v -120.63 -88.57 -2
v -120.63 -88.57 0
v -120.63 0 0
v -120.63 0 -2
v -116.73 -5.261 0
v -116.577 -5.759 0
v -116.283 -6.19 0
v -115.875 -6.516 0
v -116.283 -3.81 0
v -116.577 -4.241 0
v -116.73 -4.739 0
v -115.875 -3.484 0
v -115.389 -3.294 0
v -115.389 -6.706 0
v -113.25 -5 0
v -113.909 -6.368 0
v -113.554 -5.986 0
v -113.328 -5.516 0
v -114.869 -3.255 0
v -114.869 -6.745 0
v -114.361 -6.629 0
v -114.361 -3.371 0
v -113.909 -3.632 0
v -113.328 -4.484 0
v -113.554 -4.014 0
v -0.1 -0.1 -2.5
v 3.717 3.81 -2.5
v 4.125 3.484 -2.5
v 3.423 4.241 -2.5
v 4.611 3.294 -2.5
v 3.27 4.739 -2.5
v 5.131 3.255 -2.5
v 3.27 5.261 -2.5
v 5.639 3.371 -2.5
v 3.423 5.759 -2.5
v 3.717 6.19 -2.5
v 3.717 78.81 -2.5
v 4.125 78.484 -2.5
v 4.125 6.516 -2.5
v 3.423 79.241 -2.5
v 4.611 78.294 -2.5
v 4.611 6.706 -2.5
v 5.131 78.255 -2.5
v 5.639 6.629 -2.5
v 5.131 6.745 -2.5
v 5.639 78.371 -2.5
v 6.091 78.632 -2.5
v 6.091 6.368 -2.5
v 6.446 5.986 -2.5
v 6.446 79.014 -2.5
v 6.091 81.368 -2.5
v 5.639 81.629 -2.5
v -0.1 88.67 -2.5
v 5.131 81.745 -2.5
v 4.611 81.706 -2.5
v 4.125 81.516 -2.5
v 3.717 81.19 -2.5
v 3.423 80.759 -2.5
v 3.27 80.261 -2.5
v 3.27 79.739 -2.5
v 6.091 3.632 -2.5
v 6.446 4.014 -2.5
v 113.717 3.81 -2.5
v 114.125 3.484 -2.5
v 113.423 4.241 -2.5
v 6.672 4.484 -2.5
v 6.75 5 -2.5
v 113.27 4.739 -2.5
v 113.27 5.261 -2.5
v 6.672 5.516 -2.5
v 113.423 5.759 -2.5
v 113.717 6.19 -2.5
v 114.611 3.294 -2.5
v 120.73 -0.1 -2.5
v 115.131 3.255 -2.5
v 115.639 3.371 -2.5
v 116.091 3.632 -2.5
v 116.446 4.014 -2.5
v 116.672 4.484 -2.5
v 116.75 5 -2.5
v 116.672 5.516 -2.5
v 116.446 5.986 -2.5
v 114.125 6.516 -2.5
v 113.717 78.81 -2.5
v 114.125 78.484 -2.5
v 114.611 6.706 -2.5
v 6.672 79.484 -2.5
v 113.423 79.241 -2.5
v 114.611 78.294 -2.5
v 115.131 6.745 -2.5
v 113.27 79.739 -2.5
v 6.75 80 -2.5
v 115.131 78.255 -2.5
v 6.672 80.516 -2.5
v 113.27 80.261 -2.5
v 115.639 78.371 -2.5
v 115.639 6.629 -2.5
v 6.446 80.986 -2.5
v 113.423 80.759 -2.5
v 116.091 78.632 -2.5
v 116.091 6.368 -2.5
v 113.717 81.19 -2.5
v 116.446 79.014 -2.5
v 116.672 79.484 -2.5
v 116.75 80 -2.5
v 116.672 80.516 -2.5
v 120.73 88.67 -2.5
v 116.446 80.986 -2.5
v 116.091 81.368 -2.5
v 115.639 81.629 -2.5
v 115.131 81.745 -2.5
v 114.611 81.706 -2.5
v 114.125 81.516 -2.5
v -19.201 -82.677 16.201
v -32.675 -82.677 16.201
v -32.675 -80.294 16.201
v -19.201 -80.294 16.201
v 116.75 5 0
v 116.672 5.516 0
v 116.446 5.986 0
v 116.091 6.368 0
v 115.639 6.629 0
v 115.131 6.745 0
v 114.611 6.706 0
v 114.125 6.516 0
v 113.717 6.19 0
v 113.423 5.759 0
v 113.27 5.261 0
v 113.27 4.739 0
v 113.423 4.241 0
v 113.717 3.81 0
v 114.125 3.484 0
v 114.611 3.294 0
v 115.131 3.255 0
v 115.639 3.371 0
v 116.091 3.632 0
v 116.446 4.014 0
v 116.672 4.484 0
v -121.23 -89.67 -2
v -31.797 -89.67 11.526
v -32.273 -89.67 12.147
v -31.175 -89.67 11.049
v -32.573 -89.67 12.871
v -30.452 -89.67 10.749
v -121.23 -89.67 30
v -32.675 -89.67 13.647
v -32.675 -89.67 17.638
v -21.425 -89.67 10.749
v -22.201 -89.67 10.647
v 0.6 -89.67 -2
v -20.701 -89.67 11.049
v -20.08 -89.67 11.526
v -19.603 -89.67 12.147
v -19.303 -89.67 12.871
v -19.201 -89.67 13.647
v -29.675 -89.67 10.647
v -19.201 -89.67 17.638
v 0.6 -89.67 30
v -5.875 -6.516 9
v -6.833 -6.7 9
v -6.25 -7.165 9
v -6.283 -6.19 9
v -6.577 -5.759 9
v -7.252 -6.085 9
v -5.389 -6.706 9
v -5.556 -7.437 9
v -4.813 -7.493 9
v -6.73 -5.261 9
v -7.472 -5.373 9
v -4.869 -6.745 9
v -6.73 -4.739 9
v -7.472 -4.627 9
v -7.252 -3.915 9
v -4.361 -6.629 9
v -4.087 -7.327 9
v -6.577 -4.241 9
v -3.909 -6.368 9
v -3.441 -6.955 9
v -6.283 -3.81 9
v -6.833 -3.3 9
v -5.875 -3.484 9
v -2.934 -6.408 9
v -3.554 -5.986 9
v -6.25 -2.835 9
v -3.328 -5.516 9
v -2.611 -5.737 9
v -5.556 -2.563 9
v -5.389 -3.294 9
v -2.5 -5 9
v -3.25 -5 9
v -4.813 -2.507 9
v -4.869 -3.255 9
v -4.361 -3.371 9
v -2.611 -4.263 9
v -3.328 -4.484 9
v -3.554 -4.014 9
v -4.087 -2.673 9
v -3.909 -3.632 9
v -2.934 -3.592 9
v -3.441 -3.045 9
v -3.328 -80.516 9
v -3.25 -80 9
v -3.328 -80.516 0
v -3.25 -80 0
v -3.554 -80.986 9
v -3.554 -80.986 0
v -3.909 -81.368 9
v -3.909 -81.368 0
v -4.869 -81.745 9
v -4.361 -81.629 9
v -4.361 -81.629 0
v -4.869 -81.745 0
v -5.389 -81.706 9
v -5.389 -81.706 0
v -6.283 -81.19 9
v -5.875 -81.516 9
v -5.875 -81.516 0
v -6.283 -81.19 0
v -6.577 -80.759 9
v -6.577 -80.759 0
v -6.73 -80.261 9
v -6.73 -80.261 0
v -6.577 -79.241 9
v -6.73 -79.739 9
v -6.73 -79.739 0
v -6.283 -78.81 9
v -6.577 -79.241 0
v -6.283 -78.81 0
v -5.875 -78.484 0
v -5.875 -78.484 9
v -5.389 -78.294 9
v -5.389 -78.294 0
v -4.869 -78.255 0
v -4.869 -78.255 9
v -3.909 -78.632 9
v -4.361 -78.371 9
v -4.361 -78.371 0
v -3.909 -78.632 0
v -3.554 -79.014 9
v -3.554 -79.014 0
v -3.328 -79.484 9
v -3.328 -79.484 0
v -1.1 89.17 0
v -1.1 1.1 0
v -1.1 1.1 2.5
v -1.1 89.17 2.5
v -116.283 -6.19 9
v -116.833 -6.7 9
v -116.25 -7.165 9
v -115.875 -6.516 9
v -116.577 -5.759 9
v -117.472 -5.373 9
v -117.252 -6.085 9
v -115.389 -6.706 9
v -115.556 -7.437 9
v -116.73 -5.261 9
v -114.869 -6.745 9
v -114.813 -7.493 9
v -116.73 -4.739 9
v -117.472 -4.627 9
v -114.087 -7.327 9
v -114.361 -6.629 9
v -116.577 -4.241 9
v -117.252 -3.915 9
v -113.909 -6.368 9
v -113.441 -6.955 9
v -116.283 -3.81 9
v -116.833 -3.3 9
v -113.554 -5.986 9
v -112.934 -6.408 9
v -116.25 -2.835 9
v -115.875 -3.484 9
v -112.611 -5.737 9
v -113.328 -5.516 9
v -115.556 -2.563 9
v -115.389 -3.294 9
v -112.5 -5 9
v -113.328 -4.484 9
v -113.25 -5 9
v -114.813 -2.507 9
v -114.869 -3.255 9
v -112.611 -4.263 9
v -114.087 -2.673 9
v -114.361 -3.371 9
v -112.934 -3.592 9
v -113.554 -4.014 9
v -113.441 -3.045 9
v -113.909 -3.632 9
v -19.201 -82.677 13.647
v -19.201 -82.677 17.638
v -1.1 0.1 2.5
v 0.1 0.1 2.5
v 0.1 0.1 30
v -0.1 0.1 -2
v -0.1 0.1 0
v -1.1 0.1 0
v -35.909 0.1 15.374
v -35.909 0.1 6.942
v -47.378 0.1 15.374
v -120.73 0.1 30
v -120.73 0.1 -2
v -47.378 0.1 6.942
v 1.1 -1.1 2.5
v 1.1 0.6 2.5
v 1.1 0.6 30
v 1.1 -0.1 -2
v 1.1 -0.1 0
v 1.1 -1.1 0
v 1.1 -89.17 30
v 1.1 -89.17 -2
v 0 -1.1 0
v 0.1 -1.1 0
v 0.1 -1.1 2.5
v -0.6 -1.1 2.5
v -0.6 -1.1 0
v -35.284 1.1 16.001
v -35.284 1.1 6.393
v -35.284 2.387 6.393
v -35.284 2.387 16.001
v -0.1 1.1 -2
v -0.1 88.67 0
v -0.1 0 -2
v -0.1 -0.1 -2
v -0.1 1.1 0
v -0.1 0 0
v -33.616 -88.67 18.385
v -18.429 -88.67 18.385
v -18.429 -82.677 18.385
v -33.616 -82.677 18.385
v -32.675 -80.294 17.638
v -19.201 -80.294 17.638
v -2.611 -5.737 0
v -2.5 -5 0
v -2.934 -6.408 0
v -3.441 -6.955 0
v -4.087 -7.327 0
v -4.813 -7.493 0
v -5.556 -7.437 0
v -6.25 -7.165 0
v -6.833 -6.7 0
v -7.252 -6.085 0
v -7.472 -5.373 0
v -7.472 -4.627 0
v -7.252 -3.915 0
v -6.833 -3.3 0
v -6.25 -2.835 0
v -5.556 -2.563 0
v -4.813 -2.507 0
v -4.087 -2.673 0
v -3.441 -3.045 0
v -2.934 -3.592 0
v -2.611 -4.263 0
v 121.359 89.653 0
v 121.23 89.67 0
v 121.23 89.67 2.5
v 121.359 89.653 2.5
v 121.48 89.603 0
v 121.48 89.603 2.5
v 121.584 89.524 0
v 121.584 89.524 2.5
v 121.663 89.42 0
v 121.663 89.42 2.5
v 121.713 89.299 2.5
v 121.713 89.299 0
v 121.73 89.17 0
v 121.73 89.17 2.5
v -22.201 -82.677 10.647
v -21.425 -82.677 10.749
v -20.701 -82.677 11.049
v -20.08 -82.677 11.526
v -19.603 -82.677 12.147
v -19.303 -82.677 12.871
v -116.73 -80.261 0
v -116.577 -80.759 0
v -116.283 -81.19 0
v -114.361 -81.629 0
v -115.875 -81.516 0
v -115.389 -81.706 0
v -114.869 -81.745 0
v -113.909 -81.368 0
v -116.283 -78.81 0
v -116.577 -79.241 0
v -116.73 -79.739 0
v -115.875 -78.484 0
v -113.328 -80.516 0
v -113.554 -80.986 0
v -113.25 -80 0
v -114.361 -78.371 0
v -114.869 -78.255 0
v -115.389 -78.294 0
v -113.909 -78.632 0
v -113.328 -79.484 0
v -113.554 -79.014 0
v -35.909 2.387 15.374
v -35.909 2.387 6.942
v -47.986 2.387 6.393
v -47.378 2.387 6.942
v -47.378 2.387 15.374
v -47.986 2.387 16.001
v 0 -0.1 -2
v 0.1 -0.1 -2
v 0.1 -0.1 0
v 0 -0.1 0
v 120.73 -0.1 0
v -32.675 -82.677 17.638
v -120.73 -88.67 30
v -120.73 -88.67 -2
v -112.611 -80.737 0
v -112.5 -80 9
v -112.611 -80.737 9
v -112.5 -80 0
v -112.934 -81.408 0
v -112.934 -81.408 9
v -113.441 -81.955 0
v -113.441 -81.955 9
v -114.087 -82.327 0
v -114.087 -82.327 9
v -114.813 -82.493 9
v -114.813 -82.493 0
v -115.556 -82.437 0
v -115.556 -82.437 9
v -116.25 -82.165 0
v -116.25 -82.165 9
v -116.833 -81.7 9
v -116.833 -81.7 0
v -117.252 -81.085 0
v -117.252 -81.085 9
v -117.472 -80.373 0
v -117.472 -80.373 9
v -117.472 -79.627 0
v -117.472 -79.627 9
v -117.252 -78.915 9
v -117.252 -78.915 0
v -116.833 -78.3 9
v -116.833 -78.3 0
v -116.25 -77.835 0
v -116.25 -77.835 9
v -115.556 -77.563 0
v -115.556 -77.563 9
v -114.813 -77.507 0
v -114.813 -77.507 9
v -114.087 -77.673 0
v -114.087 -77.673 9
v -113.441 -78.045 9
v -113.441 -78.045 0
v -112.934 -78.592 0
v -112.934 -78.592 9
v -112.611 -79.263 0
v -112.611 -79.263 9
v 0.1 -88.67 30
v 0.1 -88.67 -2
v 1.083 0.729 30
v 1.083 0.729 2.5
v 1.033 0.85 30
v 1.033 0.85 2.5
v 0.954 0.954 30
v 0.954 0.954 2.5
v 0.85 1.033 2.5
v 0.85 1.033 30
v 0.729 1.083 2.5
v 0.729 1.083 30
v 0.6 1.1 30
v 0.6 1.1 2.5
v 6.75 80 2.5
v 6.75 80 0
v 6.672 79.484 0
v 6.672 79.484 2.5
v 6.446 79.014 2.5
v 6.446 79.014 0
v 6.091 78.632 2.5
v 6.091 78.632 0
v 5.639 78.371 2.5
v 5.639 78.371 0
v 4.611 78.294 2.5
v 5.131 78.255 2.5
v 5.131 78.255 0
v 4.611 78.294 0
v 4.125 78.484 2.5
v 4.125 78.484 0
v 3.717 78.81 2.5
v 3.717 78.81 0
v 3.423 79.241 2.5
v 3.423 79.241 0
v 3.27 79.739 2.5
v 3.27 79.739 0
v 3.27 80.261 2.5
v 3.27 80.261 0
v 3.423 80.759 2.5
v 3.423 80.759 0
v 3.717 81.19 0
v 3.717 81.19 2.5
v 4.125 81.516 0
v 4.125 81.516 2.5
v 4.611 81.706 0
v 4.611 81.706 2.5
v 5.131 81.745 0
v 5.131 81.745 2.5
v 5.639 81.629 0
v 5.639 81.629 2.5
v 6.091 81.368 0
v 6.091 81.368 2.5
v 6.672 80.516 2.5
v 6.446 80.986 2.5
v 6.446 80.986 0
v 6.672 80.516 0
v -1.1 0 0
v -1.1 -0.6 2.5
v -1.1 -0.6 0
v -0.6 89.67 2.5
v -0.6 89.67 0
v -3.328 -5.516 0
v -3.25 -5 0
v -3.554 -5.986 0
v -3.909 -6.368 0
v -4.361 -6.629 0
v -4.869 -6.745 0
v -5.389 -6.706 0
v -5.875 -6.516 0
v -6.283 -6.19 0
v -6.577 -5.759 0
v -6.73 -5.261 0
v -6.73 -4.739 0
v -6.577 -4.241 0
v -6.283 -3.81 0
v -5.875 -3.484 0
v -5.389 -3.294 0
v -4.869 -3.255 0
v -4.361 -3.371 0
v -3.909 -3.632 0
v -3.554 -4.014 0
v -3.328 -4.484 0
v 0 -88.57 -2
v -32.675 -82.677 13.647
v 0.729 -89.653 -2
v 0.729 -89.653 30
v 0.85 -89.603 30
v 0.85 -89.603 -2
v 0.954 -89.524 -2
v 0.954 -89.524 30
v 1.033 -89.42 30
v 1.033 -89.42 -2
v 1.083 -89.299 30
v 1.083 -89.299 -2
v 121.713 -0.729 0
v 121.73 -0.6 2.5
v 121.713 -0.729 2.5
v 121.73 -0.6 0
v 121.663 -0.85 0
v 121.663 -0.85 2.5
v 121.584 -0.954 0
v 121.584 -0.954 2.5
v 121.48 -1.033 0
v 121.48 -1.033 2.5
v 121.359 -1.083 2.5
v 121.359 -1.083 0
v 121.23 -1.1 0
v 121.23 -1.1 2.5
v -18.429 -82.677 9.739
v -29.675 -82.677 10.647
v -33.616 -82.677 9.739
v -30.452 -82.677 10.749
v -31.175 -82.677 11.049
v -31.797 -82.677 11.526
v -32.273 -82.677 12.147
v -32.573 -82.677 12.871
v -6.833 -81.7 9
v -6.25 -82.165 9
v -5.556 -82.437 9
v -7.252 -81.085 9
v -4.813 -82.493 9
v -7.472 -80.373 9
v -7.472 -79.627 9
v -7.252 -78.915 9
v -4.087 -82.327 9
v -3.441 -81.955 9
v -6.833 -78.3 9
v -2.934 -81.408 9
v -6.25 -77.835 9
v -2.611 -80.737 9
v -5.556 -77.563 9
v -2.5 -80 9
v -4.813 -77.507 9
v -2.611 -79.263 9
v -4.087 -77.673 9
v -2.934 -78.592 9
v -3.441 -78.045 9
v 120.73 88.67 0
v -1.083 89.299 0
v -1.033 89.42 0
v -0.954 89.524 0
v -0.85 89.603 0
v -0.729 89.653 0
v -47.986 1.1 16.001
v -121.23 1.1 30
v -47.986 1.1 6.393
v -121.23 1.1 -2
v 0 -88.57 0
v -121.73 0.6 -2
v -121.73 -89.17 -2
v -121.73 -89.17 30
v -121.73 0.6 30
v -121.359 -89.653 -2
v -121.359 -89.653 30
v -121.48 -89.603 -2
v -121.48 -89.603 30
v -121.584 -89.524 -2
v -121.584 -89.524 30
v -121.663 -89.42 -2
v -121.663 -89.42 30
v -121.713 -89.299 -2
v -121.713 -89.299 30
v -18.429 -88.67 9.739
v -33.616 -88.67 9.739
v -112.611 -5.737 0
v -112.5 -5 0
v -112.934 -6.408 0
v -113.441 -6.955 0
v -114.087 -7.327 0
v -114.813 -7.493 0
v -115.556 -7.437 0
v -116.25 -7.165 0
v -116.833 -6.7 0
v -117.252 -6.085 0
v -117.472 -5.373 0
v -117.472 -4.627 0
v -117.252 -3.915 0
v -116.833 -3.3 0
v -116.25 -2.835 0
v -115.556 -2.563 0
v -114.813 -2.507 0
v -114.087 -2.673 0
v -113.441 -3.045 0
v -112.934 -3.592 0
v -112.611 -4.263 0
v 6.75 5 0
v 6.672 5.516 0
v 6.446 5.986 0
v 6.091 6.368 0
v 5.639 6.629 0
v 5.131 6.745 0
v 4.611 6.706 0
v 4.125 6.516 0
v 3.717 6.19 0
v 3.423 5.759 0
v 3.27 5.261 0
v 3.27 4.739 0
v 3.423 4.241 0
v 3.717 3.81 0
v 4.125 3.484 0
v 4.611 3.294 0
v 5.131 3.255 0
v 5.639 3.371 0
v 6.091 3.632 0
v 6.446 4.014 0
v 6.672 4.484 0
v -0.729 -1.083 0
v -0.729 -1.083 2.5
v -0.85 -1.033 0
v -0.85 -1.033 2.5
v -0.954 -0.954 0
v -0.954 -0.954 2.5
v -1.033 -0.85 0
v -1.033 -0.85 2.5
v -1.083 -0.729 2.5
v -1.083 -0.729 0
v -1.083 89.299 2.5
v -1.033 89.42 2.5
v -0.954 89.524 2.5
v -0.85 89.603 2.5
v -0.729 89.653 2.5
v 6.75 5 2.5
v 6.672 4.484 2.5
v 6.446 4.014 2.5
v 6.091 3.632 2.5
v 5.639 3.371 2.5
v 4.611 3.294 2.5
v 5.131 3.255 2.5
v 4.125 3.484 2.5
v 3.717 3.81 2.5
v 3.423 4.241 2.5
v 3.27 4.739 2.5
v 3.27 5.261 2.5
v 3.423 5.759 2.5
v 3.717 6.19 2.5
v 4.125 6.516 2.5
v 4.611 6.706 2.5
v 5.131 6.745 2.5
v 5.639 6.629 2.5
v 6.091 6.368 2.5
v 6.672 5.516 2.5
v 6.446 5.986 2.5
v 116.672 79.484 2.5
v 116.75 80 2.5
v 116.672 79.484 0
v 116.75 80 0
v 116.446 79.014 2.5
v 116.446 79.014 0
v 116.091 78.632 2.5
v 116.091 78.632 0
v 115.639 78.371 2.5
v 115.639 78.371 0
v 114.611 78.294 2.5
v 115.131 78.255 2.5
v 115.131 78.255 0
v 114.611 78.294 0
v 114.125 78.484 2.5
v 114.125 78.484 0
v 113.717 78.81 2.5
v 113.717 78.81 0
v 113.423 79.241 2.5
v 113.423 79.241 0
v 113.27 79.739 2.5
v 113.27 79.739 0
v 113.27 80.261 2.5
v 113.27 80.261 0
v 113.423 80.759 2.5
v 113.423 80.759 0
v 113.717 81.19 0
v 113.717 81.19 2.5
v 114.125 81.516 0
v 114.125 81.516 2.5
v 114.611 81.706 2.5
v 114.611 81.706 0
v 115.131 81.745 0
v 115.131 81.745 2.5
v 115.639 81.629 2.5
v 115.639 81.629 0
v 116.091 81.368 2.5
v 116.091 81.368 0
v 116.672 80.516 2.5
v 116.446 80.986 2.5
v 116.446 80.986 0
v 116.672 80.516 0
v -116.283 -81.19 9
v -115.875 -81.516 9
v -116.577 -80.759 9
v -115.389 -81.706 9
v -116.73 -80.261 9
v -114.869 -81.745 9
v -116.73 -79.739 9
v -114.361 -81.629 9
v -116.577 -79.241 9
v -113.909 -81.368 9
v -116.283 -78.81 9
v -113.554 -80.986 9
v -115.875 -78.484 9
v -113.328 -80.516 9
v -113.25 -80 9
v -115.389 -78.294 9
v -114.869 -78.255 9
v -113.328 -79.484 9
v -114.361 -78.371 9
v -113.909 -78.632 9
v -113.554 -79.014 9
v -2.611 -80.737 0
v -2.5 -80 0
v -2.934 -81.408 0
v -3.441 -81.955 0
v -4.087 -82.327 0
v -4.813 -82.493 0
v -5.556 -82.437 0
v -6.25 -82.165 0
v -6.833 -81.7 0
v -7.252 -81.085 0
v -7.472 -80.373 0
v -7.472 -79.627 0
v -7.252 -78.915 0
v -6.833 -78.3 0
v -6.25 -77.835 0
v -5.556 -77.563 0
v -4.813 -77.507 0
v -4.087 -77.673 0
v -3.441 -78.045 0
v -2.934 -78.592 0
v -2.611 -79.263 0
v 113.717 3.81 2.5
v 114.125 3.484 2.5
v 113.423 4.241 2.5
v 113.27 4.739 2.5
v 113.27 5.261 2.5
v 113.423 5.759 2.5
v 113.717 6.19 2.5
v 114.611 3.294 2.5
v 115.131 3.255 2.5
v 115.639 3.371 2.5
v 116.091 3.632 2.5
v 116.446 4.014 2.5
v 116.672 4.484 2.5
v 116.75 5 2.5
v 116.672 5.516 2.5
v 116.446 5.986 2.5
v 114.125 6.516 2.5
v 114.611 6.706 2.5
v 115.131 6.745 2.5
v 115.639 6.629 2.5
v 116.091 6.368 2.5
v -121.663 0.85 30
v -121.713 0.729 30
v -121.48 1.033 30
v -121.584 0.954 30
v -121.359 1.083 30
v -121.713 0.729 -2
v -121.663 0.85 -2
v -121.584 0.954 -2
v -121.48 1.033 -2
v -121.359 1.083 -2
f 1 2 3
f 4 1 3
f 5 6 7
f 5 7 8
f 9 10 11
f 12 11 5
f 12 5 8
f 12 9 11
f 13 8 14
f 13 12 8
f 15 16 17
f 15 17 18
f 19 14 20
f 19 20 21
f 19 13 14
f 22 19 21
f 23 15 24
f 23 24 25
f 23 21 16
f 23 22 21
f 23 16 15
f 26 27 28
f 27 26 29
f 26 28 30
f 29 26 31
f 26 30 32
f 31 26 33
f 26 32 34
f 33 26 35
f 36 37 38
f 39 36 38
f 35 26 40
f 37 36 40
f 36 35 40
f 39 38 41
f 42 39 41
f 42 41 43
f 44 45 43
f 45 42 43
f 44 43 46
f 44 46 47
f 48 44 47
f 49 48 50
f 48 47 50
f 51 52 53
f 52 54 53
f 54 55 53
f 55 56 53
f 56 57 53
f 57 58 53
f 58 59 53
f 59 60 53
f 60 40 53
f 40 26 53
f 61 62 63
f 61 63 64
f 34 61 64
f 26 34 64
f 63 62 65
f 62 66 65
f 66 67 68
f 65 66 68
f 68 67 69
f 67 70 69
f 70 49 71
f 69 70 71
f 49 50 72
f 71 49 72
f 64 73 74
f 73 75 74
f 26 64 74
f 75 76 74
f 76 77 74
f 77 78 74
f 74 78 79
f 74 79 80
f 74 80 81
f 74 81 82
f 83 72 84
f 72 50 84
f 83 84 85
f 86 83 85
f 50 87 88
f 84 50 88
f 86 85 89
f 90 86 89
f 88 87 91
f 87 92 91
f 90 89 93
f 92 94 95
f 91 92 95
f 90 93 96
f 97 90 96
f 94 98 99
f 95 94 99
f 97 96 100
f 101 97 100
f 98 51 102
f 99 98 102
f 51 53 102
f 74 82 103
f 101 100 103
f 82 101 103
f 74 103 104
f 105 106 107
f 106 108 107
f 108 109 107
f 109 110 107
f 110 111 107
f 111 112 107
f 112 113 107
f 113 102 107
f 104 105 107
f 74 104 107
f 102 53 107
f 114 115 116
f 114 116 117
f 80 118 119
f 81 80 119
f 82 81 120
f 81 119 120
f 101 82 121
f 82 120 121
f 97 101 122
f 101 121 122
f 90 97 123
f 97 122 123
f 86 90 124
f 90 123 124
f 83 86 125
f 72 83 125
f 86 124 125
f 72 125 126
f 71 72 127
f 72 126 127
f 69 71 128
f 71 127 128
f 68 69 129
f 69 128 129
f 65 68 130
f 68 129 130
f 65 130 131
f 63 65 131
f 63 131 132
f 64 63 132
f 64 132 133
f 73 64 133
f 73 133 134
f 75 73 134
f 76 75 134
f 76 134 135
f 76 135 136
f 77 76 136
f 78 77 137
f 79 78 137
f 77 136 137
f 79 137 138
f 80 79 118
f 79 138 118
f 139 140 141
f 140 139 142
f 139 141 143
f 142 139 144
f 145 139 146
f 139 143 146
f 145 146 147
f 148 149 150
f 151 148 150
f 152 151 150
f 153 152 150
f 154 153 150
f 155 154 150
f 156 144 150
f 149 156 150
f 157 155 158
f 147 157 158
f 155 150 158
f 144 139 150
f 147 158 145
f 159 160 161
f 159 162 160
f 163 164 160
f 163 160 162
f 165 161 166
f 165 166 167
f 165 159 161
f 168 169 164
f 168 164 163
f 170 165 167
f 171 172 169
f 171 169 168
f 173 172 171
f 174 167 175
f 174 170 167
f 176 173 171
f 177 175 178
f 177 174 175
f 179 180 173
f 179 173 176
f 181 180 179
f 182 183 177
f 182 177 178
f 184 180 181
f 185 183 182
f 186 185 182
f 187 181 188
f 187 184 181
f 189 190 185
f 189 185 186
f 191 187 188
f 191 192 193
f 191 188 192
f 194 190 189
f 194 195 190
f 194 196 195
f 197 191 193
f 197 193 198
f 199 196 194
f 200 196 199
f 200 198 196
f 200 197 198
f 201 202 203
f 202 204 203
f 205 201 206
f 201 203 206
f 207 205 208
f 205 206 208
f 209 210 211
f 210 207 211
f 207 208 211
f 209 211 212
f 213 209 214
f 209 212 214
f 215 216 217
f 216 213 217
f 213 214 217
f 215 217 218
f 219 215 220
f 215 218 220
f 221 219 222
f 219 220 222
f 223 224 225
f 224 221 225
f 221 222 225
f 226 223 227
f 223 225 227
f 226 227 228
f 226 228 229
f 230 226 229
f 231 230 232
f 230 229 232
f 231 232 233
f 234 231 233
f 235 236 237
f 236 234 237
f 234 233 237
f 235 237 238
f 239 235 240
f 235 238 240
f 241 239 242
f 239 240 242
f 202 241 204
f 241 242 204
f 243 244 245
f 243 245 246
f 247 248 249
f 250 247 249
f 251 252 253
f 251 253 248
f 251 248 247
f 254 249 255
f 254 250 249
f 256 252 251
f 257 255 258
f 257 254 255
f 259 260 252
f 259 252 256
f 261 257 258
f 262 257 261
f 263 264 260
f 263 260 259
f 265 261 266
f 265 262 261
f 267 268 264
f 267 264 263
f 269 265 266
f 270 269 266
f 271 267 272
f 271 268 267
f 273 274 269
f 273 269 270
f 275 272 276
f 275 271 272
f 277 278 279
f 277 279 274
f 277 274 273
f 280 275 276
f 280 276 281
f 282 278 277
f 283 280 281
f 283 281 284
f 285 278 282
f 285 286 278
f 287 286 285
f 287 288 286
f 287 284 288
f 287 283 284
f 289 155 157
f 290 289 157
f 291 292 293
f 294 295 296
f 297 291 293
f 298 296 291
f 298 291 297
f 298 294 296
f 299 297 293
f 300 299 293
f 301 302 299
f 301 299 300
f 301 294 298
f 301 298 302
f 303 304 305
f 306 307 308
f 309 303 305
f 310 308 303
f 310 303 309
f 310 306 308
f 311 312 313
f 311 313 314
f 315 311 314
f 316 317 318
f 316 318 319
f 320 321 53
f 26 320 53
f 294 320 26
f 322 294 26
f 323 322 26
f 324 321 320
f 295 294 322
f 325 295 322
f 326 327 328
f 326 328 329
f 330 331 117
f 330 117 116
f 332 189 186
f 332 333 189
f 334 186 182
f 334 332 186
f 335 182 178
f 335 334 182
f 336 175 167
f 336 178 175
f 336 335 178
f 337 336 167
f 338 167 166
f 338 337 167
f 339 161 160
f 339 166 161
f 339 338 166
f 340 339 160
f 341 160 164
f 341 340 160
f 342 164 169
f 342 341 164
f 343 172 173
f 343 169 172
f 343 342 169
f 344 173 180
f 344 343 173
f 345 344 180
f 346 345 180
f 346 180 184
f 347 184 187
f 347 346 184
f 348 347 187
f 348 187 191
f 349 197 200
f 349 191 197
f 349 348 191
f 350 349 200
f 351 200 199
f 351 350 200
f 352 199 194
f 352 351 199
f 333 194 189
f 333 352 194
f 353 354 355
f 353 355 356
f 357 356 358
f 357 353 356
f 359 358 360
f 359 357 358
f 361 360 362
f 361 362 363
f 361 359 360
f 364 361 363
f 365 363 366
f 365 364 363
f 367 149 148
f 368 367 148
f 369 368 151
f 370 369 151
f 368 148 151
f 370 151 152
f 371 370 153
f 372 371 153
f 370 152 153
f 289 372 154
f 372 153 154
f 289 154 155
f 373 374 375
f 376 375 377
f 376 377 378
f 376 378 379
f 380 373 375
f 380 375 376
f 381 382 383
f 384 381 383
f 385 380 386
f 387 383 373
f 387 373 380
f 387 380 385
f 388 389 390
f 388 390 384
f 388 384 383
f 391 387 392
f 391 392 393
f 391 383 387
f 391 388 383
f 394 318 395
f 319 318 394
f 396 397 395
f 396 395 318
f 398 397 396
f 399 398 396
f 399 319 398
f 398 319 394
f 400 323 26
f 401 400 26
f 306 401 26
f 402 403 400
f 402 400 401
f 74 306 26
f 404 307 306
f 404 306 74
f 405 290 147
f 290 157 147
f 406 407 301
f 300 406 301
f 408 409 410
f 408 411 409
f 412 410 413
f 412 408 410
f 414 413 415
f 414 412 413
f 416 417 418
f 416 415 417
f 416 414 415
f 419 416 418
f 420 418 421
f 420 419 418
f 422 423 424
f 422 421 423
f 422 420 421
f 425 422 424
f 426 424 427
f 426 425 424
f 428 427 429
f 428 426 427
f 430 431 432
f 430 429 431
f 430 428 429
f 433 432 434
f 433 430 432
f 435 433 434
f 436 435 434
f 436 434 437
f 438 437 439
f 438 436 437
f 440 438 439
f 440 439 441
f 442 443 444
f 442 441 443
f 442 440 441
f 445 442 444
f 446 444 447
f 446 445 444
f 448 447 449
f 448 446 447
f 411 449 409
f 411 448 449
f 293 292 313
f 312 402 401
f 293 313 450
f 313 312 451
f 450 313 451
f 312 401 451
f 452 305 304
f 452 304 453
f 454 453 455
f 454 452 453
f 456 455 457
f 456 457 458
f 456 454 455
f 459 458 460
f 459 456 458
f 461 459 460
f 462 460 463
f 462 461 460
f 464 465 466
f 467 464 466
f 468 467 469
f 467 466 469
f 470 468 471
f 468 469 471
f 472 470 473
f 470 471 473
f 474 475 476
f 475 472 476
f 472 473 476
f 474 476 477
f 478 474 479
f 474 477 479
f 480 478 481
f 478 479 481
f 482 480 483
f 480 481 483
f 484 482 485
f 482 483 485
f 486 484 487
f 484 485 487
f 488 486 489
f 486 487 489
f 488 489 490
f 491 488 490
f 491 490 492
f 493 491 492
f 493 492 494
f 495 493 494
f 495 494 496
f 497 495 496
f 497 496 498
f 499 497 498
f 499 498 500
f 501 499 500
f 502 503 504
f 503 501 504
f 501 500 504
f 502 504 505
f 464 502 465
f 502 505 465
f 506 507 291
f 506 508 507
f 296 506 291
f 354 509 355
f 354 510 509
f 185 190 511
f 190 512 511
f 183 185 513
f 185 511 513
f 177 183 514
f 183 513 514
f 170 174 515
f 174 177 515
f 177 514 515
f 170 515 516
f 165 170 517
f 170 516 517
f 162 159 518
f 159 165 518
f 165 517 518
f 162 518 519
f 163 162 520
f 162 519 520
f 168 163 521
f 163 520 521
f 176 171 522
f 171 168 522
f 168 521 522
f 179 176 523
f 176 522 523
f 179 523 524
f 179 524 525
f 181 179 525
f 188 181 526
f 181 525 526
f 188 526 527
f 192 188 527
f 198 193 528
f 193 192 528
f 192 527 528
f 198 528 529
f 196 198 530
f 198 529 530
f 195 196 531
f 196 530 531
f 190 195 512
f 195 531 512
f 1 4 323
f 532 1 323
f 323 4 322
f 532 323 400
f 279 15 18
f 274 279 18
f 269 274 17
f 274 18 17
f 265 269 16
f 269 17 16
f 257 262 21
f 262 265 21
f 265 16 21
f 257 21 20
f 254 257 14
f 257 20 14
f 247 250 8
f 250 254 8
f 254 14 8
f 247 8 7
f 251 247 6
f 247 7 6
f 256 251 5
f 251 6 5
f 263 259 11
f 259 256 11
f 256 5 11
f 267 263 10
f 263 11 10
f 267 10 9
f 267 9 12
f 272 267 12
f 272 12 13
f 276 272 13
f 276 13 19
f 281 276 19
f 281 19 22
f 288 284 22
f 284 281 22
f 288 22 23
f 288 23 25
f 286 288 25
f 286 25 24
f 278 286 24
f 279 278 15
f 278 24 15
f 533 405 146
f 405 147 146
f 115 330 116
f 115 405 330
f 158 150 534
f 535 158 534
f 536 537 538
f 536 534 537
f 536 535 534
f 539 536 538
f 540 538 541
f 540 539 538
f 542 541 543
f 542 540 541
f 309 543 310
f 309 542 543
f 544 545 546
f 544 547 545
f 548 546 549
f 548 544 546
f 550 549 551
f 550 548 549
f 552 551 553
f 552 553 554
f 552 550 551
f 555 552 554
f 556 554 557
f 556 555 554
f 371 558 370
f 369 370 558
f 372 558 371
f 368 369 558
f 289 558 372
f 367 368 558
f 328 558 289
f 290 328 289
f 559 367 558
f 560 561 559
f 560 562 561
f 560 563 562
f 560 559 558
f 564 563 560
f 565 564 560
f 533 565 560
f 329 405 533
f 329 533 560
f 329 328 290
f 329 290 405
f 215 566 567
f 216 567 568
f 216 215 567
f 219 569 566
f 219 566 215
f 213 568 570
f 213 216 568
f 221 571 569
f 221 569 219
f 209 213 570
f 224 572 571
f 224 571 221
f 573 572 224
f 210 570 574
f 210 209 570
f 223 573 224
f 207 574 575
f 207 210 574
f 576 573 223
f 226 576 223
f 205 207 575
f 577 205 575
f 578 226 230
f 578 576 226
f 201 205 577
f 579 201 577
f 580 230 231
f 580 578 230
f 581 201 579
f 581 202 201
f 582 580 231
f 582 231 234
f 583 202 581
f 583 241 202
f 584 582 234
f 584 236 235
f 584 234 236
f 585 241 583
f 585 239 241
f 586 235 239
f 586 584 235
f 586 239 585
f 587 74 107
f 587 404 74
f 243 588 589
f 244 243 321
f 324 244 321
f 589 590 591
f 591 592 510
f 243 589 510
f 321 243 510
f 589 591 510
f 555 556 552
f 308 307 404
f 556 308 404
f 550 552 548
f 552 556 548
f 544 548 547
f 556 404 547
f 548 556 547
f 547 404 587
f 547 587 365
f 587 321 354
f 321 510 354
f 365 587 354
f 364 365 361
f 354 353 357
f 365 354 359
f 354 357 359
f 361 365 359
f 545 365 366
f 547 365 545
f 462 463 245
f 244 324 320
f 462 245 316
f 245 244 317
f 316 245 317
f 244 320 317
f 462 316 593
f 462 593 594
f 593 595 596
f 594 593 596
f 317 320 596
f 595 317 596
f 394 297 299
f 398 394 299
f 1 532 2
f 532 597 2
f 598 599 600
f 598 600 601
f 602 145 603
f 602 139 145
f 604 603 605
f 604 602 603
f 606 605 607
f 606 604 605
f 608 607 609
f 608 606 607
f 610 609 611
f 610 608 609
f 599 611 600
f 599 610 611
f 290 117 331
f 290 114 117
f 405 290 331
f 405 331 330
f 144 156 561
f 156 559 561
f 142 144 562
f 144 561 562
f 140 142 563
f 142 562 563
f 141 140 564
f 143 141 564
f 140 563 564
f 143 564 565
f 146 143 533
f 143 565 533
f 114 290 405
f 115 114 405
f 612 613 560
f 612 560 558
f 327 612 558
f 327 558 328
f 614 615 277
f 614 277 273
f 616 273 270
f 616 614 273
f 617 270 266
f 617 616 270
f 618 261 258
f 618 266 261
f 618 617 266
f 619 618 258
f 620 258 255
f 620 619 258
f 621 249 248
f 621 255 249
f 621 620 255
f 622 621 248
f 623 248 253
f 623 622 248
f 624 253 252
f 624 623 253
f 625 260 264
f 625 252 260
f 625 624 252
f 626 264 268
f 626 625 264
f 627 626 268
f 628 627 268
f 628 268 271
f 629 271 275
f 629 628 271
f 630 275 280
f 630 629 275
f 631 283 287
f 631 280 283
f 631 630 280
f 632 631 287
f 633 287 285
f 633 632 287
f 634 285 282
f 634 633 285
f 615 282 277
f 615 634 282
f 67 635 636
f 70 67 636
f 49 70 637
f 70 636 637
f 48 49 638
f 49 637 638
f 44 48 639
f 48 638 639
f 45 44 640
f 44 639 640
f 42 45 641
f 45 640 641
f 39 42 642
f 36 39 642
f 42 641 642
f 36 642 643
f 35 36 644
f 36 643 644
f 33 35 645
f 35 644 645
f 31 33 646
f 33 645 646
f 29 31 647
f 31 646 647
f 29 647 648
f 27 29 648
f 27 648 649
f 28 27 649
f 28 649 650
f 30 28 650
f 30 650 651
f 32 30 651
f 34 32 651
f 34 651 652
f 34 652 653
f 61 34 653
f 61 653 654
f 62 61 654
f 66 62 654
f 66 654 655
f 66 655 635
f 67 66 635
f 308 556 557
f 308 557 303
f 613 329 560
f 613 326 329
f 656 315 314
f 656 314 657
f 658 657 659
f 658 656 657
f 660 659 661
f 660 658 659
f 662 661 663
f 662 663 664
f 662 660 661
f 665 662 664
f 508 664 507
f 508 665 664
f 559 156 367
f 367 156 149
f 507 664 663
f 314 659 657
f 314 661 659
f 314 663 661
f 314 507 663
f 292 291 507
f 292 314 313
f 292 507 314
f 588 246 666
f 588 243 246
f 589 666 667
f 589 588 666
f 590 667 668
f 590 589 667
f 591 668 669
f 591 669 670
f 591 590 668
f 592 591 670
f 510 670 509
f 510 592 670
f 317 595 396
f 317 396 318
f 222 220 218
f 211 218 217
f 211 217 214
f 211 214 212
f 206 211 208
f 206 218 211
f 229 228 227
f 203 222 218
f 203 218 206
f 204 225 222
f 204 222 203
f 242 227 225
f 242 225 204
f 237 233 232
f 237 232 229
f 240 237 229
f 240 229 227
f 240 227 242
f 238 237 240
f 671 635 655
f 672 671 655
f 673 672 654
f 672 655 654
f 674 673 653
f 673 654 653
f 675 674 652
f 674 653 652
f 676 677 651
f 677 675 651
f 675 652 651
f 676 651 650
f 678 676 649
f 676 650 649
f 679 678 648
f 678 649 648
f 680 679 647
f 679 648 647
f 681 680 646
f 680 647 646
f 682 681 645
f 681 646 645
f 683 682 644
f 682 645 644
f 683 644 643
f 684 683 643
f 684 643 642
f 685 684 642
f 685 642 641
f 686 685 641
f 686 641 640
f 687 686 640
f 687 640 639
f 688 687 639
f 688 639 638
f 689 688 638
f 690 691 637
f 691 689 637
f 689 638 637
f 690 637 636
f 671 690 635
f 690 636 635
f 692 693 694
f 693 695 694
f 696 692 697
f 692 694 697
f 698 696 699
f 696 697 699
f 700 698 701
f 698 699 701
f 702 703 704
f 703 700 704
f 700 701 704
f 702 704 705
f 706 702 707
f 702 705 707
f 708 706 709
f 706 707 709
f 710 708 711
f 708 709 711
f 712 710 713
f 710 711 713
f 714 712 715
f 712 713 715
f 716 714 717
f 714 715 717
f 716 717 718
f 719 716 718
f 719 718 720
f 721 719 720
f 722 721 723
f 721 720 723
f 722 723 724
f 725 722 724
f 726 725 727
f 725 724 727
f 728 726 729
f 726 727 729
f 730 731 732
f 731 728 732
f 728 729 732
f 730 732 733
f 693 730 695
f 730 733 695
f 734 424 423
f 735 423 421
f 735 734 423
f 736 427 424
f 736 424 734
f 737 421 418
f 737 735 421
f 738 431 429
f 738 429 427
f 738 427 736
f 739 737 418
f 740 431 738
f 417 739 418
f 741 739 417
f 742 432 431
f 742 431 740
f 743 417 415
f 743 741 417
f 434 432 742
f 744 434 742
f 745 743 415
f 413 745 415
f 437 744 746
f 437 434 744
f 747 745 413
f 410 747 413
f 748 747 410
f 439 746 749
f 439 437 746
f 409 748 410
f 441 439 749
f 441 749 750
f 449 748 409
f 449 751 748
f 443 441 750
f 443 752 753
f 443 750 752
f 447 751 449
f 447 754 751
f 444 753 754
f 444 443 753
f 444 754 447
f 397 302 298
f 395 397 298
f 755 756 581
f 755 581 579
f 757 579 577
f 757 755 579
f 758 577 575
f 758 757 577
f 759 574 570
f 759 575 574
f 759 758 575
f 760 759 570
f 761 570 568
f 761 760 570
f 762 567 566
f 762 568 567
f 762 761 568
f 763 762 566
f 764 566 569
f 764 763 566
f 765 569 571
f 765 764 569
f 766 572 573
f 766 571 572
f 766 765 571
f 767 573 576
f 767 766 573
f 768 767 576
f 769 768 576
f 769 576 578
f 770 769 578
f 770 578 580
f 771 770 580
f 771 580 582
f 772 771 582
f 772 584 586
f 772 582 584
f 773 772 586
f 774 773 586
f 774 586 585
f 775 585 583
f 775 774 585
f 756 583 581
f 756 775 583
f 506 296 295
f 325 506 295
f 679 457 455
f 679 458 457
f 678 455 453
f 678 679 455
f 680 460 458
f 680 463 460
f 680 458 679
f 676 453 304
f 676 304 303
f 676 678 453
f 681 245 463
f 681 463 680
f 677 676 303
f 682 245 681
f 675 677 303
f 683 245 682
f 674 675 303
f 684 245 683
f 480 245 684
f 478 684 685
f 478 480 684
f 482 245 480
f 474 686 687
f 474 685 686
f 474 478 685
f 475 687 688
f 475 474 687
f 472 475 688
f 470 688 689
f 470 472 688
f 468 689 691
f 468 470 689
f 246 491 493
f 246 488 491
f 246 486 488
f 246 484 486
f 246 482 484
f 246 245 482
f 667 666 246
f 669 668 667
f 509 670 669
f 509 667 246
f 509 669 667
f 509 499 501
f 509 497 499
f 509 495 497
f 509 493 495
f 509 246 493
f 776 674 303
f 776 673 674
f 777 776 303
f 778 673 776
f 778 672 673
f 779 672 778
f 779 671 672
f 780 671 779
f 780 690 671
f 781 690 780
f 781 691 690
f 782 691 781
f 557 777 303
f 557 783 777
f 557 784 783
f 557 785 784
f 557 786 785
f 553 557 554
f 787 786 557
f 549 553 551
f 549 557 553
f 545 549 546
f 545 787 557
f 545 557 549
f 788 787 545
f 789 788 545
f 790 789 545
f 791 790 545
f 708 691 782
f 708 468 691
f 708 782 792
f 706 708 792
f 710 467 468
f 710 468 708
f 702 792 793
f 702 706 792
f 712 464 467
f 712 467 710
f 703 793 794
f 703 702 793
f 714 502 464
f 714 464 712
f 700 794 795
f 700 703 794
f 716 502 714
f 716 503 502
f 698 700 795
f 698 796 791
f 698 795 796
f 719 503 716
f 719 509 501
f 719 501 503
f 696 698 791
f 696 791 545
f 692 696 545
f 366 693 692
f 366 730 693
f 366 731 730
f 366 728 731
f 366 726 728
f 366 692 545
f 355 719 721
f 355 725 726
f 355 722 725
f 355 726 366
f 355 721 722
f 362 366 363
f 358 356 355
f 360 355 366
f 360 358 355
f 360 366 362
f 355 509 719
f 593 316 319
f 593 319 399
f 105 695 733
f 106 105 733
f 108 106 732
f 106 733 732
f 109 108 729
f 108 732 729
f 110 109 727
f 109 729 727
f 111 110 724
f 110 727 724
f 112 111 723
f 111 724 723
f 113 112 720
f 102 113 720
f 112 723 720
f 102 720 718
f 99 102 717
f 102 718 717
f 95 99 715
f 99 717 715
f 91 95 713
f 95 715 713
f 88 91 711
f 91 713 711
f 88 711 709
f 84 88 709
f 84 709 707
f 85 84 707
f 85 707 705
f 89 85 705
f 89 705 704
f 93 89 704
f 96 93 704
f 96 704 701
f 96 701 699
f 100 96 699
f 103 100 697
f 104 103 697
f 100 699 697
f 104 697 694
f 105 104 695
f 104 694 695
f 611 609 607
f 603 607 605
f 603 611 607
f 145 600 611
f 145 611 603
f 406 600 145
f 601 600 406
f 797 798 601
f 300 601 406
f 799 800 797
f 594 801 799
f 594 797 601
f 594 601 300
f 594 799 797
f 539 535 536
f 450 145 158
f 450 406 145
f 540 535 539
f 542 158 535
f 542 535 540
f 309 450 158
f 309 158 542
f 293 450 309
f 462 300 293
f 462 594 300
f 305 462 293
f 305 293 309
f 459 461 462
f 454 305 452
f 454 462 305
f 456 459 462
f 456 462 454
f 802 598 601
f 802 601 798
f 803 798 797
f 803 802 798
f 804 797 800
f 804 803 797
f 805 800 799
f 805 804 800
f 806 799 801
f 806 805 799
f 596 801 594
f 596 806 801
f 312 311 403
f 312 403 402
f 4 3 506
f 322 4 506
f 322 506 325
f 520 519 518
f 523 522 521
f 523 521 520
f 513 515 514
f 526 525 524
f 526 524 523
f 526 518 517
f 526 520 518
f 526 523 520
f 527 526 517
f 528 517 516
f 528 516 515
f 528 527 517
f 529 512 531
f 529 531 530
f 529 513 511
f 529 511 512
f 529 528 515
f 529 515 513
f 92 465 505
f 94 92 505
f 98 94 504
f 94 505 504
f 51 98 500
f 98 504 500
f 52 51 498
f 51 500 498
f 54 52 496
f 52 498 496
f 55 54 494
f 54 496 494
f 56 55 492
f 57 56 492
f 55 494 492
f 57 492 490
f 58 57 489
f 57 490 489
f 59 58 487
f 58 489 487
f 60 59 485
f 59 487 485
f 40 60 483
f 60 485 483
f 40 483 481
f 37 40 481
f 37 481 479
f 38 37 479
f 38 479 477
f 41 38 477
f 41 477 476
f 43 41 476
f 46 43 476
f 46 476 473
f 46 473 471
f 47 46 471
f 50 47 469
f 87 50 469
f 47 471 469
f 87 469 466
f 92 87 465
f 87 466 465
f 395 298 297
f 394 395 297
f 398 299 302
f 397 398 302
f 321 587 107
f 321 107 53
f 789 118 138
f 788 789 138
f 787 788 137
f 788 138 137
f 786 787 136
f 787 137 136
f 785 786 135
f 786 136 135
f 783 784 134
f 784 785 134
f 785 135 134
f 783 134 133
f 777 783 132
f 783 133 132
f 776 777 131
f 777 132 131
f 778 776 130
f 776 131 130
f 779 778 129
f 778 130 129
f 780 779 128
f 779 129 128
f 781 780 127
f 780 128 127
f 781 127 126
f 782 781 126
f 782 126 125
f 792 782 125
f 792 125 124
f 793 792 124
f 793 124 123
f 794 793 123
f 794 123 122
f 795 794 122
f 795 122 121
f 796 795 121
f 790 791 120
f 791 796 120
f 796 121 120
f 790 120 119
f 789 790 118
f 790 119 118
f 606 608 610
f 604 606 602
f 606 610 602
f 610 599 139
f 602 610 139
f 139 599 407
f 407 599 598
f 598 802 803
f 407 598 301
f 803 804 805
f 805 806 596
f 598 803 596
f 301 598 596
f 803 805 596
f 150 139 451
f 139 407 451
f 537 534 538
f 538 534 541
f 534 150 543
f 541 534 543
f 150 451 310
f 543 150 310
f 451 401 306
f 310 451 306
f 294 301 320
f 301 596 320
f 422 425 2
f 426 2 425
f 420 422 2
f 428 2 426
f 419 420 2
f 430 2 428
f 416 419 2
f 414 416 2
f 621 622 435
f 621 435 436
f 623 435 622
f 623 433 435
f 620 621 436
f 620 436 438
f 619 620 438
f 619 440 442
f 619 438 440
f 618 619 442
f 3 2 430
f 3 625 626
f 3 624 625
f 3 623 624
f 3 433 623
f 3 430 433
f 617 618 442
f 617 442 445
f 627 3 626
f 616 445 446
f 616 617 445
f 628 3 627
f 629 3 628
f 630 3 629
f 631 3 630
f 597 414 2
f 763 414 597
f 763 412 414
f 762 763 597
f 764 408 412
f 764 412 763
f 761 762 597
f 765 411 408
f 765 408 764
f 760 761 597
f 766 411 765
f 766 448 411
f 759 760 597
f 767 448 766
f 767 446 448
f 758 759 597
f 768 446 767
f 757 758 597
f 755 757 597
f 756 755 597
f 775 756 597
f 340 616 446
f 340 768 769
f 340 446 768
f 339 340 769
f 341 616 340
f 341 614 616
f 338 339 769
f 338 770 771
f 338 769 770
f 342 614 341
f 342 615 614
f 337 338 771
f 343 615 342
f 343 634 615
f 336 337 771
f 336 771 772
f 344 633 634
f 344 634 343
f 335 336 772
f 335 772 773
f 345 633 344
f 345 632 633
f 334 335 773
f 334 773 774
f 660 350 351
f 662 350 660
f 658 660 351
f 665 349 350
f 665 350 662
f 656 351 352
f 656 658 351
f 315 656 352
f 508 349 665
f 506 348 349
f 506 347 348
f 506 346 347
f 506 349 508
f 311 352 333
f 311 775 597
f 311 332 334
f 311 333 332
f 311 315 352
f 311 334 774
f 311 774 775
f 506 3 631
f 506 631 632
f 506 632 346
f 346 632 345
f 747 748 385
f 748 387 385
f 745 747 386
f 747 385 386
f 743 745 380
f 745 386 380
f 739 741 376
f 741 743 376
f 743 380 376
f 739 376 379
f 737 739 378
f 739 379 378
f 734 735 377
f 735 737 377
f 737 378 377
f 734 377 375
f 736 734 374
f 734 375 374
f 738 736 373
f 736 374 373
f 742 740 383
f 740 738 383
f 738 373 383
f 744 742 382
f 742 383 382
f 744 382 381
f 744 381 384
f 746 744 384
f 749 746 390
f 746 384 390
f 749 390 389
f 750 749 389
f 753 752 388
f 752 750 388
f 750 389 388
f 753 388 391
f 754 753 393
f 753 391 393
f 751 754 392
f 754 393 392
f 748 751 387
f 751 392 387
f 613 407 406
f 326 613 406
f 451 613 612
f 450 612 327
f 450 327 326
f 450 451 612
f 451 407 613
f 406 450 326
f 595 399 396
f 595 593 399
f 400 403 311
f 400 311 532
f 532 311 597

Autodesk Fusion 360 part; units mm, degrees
sketch "Sketch 1" plane through (0, 0, 0) normal (0, 0, 1) x (1, 0, 0)
  line L0 (-120.63, -88.57) -> (-120.63, 0)
  circle A0 centre (-115, -5) radius 1.75
  line L1 (0, 0) -> (0, -88.57)
  circle A1 centre (-115, -80) radius 1.75
  line L2 (-120.63, 0) -> (0, 0)
  circle A2 centre (-5, -80) radius 1.75
  line L3 (0, -88.57) -> (-120.63, -88.57)
  circle A3 centre (-5, -5) radius 1.75
  line L4 (0.1, -88.67) -> (-120.73, -88.67)
  line L5 (-120.73, -88.67) -> (-120.73, 0.1)
  line L6 (-120.73, 0.1) -> (0.1, 0.1)
  line L7 (0.1, 0.1) -> (0.1, -88.67)
  line L8 (1.1, -89.67) -> (-121.73, -89.67)
  line L9 (-121.73, -89.67) -> (-121.73, 1.1)
  line L10 (-121.73, 1.1) -> (1.1, 1.1)
  line L11 (1.1, 1.1) -> (1.1, -89.67)
  circle A4 centre (-115, -5) radius 2.5
  circle A5 centre (-115, -80) radius 2.5
  circle A6 centre (-5, -80) radius 2.5
  circle A7 centre (-5, -5) radius 2.5
  dimension "d1" = -0.1
  dimension "d2" = -1.1
  dimension "d7" = 5
  dimension "d8" = 5
  dimension "d9" = 5
  dimension "d10" = 5
extrude "Extrude1" add sketch "Sketch 1" against normal blind 2 contours L0 L1 L2 L3 | A0 | A1 | A2 | A3 | L8 L9 L10 L11 | A4 | A5 | A6 | A7 makes body 1 at (-40.21, -29.5233, 0) makes body 2 at (-40.1767, 0.7667, 0)
extrude "Extrude2" add sketch "Sketch 1" along normal blind 35 contours L8 L9 L10 L11 bodies 2
extrude "Extrude4" add sketch "Sketch 1" along normal blind 4 contours A4 | A5 | A6 | A7 bodies 1
extrude "Extrude5" add 4 faces at (-2.7658, -5.2111, 4) (-113.9872, -7.0026, 4) (-117.1045, -80.7791, 4) (-2.7593, -80.1242, 4) along direction (0, 0, 1) blind 3 on bodies 1 bodies 1
extrude "Extrude6" add 4 faces at (-113.9872, -7.0026, 7) (-2.7658, -5.2111, 7) (-117.1045, -80.7791, 7) (-2.7593, -80.1242, 7) along direction (0, 0, 1) blind 2 on bodies 1 bodies 1
extrude "Extrude7" cut 1 faces at (-40.1767, 0.7667, 35) along direction (0, 0, -1) blind 10 on bodies 2 bodies 2
extrude "Extrude8" add 1 faces at (-40.1767, 0.7667, 25) along direction (0, 0, 1) blind 5 on bodies 2 bodies 2
sketch "Sketch3" plane through (0, -89.67, 0) normal (0, -1, 0) x (1, 0, 0)
  line L0 (-121.73, 30) -> (-121.73, -2)
  line L1 (-121.73, -2) -> (1.1, -2)
  line L2 (1.1, -2) -> (1.1, 30)
  line L3 (1.1, 30) -> (-121.73, 30)
  line L4 (1.1, 5.8274) -> (-16.9, 5.8274) construction
  line L5 (-17.1151, -2) -> (-17.1151, 6) construction
  line L6 (-17.1151, 6) -> (-31.8464, 6)
  line L7 (-31.8464, 6) -> (-31.8464, 13)
  line L8 (-31.8464, 13) -> (-17.1151, 13)
  line L9 (-17.1151, 13) -> (-17.1151, 6)
  dimension "d23" = 18
  dimension "d24" = 8
  dimension "d25" = 7
extrude "Extrude9" cut sketch "Sketch3" along normal blind 5.784 from surface at -1 contours L6 L7 L8 L9 bodies 2
extrude "Extrude10" add 1 faces at (-22.0255, -89.0033, 6) along direction (0, 0, 1) blind 2.752 on bodies 2 bodies 2
extrude "Extrude11" cut 1 faces at (-26.936, -89.0033, 13) along direction (0, 0, 1) blind 2.948 on bodies 2 bodies 2
extrude "Extrude12" cut 1 faces at (-26.936, -89.0033, 15.948) along direction (0, 0, 1) blind 1.69 on bodies 2 bodies 2
extrude "Extrude13" add 1 faces at (-22.0255, -89.0033, 8.752) along direction (0, 0, 1) blind 1.895 on bodies 2 bodies 2
extrude "Extrude14" add 1 faces at (-17.1151, -89.0033, 15.3077) along direction (-1, 0, 0) blind 2.086 on bodies 2 bodies 2
extrude "Extrude15" cut 1 faces at (-31.8464, -89.0033, 12.9773) along direction (-1, 0, 0) blind 0.829 on bodies 2 bodies 2
sketch "Sketch4" plane through (0, -88.67, 0) normal (0, 1, 0) x (-1, 0, 0)
  line L0 (32.6754, 10.647) -> (19.2011, 10.647)
  line L1 (19.2011, 10.647) -> (19.2011, 17.638)
  line L2 (19.2011, 17.638) -> (32.6754, 17.638)
  line L3 (32.6754, 17.638) -> (32.6754, 10.647)
  line L4 (-0.1, 30) -> (-0.1, -2)
  line L5 (-0.1, -2) -> (120.73, -2)
  line L6 (120.73, -2) -> (120.73, 30)
  line L7 (120.73, 30) -> (-0.1, 30)
  line L8 (18.4293, 18.3854) -> (33.6158, 18.3854)
  line L9 (33.6158, 18.3854) -> (33.6158, 9.7391)
  line L10 (33.6158, 9.7391) -> (18.4293, 9.7391)
  line L11 (18.4293, 9.7391) -> (18.4293, 18.3854)
extrude "Extrude16" add sketch "Sketch4" along normal blind 12.179 contours L8 L9 L10 L11 bodies 2
extrude "Extrude17" cut 1 faces at (-33.3023, -76.491, 12.9239) along direction (0, -1, 0) blind 6.186 on bodies 2 bodies 2
fillet "Fillet1" radius 0.5 1 edges at (1.1, 1.1, 14) on bodies 2
fillet "Fillet2" radius 0.5 1 edges at (1.1, -89.67, 14) on bodies 2
fillet "Fillet3" radius 0.5 1 edges at (-121.73, 1.1, 14) on bodies 2
fillet "Fillet4" radius 0.5 1 edges at (-121.73, -89.67, 14) on bodies 2
fillet "Fillet5" radius 3 1 edges at (-19.2011, -86.1735, 10.647) on bodies 2
fillet "Fillet6" radius 3 1 edges at (-32.6754, -86.1735, 10.647) on bodies 2
sketch "Sketch5" plane through (0, -82.677, 0) normal (0, 1, 0) x (-1, 0, 0)
  line L0 (19.2011, 17.638) -> (32.6754, 17.638)
  line L1 (32.6754, 17.638) -> (32.6754, 13.647)
  arc A0 (29.6754, 10.647) -> (32.6754, 13.647) centre (29.6754, 13.647) ccw
  line L2 (29.6754, 10.647) -> (22.2011, 10.647)
  arc A1 (19.2011, 13.647) -> (22.2011, 10.647) centre (22.2011, 13.647) ccw
  line L3 (19.2011, 13.647) -> (19.2011, 17.638)
  line L4 (18.4293, 9.7391) -> (33.6158, 9.7391)
  line L5 (33.6158, 9.7391) -> (33.6158, 18.3854)
  line L6 (33.6158, 18.3854) -> (18.4293, 18.3854)
  line L7 (18.4293, 18.3854) -> (18.4293, 9.7391)
  line L8 (19.2011, 17.638) -> (32.6754, 17.638)
  line L9 (32.6754, 17.638) -> (32.6754, 16.201)
  line L10 (32.6754, 16.201) -> (19.2011, 16.201)
  line L11 (19.2011, 16.201) -> (19.2011, 17.638)
extrude "Extrude18" add sketch "Sketch5" along normal blind 2.383 separate body contours L0 L1 L3 L8 L9 L10 L11 makes body 3
sketch "Sketch6" plane through (0, -82.677, 0) normal (0, 1, 0) x (-1, 0, 0)
  line L0 (19.2011, 17.638) -> (32.6754, 17.638)
  line L1 (32.6754, 17.638) -> (32.6754, 13.647)
  arc A0 (29.6754, 10.647) -> (32.6754, 13.647) centre (29.6754, 13.647) ccw
  line L2 (29.6754, 10.647) -> (22.2011, 10.647)
  arc A1 (19.2011, 13.647) -> (22.2011, 10.647) centre (22.2011, 13.647) ccw
  line L3 (19.2011, 13.647) -> (19.2011, 17.638)
  line L4 (18.4293, 9.7391) -> (33.6158, 9.7391)
  line L5 (33.6158, 9.7391) -> (33.6158, 18.3854)
  line L6 (33.6158, 18.3854) -> (18.4293, 18.3854)
  line L7 (18.4293, 18.3854) -> (18.4293, 9.7391)
sketch "Sketch7" plane through (0, -82.677, 0) normal (0, 1, 0) x (-1, 0, 0)
sketch "Sketch8" plane through (0, -82.677, 0) normal (0, 1, 0) x (-1, 0, 0)
sketch "Sketch9" plane through (0, -82.677, 0) normal (0, 1, 0) x (-1, 0, 0)
sketch "Sketch10" plane through (0, -88.67, 0) normal (0, 1, 0) x (-1, 0, 0)
sketch "Sketch11" plane through (0, 1.1, 0) normal (0, 1, 0) x (-1, 0, 0)
  line L0 (121.23, -2) -> (121.23, 30)
  line L1 (121.23, 30) -> (-0.6, 30)
  line L2 (-0.6, 30) -> (-0.6, -2)
  line L3 (-0.6, -2) -> (121.23, -2)
  line L4 (19.1502, 15.374) -> (32.0205, 15.374)
  line L5 (32.0205, 15.374) -> (32.0205, 4.3423)
  line L6 (32.0205, 4.3423) -> (19.1502, 4.3423)
  line L7 (19.1502, 4.3423) -> (19.1502, 15.374)
extrude "Extrude19" cut sketch "Sketch11" along normal blind 7.369 from surface at -1 contours L4 L5 L6 L7 bodies 2
extrude "Extrude20" cut 1 faces at (-32.0205, 0.4333, 11.6967) along direction (-1, 0, 0) blind 22.557 on bodies 2 bodies 2
extrude "Extrude21" add 1 faces at (-19.1502, 0.4333, 8.0195) along direction (-1, 0, 0) blind 20.425 on bodies 2 bodies 2
extrude "Extrude22" cut 1 faces at (-39.5752, 0.4333, 8.0195) along direction (1, 0, 0) blind 4.126 on bodies 2 bodies 2
extrude "Extrude23" add 1 faces at (-54.5775, 0.4333, 11.6967) along direction (1, 0, 0) blind 5.127 on bodies 2 bodies 2
extrude "Extrude24" add 1 faces at (-44.7834, 0.4333, 4.3423) along direction (0, 0, 1) blind 0.064 on bodies 2 bodies 2
extrude "Extrude25" add 1 faces at (-49.4505, 0.4333, 11.7181) along direction (1, 0, 0) blind 2.072 on bodies 2 bodies 2
extrude "Extrude26" add 1 faces at (-35.4492, 0.7667, 8.0622) along direction (-1, 0, 0) blind 0.46 on bodies 2 bodies 2
extrude "Extrude27" add 1 faces at (-43.5554, 0.4333, 4.4063) along direction (0, 0, 1) blind 1.078 on bodies 2 bodies 2
extrude "Extrude28" add 1 faces at (-43.5554, 0.4333, 5.4843) along direction (0, 0, 1) blind 1.458 on bodies 2 bodies 2
sketch "Sketch12" plane through (0, 1.1, 0) normal (0, 1, 0) x (-1, 0, 0)
  line L0 (35.9092, 15.374) -> (47.3785, 15.374)
  line L1 (47.3785, 15.374) -> (47.3785, 6.9423)
  line L2 (47.3785, 6.9423) -> (35.9092, 6.9423)
  line L3 (35.9092, 6.9423) -> (35.9092, 15.374)
  line L4 (121.23, -2) -> (121.23, 30)
  line L5 (121.23, 30) -> (-0.6, 30)
  line L6 (-0.6, 30) -> (-0.6, -2)
  line L7 (-0.6, -2) -> (121.23, -2)
  line L8 (35.2835, 16.0008) -> (47.986, 16.0008)
  line L9 (47.986, 16.0008) -> (47.986, 6.3931)
  line L10 (47.986, 6.3931) -> (35.2835, 6.3931)
  line L11 (35.2835, 6.3931) -> (35.2835, 16.0008)
  dimension "d74" = 12.7025
extrude "Extrude29" add sketch "Sketch12" along normal blind 1.287 contours L8 L9 L10 L11 bodies 2
extrude "Extrude3" [suppressed]

Autodesk Fusion 360 part; units mm, degrees
sketch "Sketch 2" plane through (0, 0, 0) normal (0, 0, 1) x (1, 0, 0)
  circle A0 centre (5, 80) radius 1.75
  line L0 (-0.1, -0.1) -> (120.73, -0.1)
  arc A1 (-0.6, -1.1) -> (-1.1, -0.6) centre (-0.6, -0.6) cw
  line L1 (-1.1, -0.6) -> (-1.1, 89.17)
  arc A2 (-1.1, 89.17) -> (-0.6, 89.67) centre (-0.6, 89.17) cw
  line L2 (121.73, 89.17) -> (121.73, -0.6)
  circle A3 centre (115, 80) radius 1.75
  line L3 (120.73, -0.1) -> (120.73, 88.67)
  line L4 (120.73, 88.67) -> (-0.1, 88.67)
  circle A4 centre (115, 5) radius 1.75
  circle A5 centre (5, 5) radius 1.75
  line L5 (121.23, -1.1) -> (-0.6, -1.1)
  arc A6 (121.23, 89.67) -> (121.73, 89.17) centre (121.23, 89.17) cw
  line L6 (-0.1, 88.67) -> (-0.1, -0.1)
  arc A7 (121.73, -0.6) -> (121.23, -1.1) centre (121.23, -0.6) cw
  line L7 (-0.6, 89.67) -> (121.23, 89.67)
  line L8 (-0.1, 88.67) -> (120.73, 88.67)
  line L9 (120.73, 88.67) -> (120.73, -0.1)
  line L10 (120.73, -0.1) -> (-0.1, -0.1)
  line L11 (-0.1, -0.1) -> (-0.1, 88.67)
  dimension "d1" = 1
extrude "Extrude1" add sketch "Sketch 2" along normal blind 2.5 contours L0 L3 L4 L6 L8 L9 L10 L11 | A1 L1 A2 L2 L5 A6 A7 L7
extrude "Extrude2" add sketch "Sketch 2" against normal blind 2.5 contours L0 L3 L4 L6 L8 L9 L10 L11
